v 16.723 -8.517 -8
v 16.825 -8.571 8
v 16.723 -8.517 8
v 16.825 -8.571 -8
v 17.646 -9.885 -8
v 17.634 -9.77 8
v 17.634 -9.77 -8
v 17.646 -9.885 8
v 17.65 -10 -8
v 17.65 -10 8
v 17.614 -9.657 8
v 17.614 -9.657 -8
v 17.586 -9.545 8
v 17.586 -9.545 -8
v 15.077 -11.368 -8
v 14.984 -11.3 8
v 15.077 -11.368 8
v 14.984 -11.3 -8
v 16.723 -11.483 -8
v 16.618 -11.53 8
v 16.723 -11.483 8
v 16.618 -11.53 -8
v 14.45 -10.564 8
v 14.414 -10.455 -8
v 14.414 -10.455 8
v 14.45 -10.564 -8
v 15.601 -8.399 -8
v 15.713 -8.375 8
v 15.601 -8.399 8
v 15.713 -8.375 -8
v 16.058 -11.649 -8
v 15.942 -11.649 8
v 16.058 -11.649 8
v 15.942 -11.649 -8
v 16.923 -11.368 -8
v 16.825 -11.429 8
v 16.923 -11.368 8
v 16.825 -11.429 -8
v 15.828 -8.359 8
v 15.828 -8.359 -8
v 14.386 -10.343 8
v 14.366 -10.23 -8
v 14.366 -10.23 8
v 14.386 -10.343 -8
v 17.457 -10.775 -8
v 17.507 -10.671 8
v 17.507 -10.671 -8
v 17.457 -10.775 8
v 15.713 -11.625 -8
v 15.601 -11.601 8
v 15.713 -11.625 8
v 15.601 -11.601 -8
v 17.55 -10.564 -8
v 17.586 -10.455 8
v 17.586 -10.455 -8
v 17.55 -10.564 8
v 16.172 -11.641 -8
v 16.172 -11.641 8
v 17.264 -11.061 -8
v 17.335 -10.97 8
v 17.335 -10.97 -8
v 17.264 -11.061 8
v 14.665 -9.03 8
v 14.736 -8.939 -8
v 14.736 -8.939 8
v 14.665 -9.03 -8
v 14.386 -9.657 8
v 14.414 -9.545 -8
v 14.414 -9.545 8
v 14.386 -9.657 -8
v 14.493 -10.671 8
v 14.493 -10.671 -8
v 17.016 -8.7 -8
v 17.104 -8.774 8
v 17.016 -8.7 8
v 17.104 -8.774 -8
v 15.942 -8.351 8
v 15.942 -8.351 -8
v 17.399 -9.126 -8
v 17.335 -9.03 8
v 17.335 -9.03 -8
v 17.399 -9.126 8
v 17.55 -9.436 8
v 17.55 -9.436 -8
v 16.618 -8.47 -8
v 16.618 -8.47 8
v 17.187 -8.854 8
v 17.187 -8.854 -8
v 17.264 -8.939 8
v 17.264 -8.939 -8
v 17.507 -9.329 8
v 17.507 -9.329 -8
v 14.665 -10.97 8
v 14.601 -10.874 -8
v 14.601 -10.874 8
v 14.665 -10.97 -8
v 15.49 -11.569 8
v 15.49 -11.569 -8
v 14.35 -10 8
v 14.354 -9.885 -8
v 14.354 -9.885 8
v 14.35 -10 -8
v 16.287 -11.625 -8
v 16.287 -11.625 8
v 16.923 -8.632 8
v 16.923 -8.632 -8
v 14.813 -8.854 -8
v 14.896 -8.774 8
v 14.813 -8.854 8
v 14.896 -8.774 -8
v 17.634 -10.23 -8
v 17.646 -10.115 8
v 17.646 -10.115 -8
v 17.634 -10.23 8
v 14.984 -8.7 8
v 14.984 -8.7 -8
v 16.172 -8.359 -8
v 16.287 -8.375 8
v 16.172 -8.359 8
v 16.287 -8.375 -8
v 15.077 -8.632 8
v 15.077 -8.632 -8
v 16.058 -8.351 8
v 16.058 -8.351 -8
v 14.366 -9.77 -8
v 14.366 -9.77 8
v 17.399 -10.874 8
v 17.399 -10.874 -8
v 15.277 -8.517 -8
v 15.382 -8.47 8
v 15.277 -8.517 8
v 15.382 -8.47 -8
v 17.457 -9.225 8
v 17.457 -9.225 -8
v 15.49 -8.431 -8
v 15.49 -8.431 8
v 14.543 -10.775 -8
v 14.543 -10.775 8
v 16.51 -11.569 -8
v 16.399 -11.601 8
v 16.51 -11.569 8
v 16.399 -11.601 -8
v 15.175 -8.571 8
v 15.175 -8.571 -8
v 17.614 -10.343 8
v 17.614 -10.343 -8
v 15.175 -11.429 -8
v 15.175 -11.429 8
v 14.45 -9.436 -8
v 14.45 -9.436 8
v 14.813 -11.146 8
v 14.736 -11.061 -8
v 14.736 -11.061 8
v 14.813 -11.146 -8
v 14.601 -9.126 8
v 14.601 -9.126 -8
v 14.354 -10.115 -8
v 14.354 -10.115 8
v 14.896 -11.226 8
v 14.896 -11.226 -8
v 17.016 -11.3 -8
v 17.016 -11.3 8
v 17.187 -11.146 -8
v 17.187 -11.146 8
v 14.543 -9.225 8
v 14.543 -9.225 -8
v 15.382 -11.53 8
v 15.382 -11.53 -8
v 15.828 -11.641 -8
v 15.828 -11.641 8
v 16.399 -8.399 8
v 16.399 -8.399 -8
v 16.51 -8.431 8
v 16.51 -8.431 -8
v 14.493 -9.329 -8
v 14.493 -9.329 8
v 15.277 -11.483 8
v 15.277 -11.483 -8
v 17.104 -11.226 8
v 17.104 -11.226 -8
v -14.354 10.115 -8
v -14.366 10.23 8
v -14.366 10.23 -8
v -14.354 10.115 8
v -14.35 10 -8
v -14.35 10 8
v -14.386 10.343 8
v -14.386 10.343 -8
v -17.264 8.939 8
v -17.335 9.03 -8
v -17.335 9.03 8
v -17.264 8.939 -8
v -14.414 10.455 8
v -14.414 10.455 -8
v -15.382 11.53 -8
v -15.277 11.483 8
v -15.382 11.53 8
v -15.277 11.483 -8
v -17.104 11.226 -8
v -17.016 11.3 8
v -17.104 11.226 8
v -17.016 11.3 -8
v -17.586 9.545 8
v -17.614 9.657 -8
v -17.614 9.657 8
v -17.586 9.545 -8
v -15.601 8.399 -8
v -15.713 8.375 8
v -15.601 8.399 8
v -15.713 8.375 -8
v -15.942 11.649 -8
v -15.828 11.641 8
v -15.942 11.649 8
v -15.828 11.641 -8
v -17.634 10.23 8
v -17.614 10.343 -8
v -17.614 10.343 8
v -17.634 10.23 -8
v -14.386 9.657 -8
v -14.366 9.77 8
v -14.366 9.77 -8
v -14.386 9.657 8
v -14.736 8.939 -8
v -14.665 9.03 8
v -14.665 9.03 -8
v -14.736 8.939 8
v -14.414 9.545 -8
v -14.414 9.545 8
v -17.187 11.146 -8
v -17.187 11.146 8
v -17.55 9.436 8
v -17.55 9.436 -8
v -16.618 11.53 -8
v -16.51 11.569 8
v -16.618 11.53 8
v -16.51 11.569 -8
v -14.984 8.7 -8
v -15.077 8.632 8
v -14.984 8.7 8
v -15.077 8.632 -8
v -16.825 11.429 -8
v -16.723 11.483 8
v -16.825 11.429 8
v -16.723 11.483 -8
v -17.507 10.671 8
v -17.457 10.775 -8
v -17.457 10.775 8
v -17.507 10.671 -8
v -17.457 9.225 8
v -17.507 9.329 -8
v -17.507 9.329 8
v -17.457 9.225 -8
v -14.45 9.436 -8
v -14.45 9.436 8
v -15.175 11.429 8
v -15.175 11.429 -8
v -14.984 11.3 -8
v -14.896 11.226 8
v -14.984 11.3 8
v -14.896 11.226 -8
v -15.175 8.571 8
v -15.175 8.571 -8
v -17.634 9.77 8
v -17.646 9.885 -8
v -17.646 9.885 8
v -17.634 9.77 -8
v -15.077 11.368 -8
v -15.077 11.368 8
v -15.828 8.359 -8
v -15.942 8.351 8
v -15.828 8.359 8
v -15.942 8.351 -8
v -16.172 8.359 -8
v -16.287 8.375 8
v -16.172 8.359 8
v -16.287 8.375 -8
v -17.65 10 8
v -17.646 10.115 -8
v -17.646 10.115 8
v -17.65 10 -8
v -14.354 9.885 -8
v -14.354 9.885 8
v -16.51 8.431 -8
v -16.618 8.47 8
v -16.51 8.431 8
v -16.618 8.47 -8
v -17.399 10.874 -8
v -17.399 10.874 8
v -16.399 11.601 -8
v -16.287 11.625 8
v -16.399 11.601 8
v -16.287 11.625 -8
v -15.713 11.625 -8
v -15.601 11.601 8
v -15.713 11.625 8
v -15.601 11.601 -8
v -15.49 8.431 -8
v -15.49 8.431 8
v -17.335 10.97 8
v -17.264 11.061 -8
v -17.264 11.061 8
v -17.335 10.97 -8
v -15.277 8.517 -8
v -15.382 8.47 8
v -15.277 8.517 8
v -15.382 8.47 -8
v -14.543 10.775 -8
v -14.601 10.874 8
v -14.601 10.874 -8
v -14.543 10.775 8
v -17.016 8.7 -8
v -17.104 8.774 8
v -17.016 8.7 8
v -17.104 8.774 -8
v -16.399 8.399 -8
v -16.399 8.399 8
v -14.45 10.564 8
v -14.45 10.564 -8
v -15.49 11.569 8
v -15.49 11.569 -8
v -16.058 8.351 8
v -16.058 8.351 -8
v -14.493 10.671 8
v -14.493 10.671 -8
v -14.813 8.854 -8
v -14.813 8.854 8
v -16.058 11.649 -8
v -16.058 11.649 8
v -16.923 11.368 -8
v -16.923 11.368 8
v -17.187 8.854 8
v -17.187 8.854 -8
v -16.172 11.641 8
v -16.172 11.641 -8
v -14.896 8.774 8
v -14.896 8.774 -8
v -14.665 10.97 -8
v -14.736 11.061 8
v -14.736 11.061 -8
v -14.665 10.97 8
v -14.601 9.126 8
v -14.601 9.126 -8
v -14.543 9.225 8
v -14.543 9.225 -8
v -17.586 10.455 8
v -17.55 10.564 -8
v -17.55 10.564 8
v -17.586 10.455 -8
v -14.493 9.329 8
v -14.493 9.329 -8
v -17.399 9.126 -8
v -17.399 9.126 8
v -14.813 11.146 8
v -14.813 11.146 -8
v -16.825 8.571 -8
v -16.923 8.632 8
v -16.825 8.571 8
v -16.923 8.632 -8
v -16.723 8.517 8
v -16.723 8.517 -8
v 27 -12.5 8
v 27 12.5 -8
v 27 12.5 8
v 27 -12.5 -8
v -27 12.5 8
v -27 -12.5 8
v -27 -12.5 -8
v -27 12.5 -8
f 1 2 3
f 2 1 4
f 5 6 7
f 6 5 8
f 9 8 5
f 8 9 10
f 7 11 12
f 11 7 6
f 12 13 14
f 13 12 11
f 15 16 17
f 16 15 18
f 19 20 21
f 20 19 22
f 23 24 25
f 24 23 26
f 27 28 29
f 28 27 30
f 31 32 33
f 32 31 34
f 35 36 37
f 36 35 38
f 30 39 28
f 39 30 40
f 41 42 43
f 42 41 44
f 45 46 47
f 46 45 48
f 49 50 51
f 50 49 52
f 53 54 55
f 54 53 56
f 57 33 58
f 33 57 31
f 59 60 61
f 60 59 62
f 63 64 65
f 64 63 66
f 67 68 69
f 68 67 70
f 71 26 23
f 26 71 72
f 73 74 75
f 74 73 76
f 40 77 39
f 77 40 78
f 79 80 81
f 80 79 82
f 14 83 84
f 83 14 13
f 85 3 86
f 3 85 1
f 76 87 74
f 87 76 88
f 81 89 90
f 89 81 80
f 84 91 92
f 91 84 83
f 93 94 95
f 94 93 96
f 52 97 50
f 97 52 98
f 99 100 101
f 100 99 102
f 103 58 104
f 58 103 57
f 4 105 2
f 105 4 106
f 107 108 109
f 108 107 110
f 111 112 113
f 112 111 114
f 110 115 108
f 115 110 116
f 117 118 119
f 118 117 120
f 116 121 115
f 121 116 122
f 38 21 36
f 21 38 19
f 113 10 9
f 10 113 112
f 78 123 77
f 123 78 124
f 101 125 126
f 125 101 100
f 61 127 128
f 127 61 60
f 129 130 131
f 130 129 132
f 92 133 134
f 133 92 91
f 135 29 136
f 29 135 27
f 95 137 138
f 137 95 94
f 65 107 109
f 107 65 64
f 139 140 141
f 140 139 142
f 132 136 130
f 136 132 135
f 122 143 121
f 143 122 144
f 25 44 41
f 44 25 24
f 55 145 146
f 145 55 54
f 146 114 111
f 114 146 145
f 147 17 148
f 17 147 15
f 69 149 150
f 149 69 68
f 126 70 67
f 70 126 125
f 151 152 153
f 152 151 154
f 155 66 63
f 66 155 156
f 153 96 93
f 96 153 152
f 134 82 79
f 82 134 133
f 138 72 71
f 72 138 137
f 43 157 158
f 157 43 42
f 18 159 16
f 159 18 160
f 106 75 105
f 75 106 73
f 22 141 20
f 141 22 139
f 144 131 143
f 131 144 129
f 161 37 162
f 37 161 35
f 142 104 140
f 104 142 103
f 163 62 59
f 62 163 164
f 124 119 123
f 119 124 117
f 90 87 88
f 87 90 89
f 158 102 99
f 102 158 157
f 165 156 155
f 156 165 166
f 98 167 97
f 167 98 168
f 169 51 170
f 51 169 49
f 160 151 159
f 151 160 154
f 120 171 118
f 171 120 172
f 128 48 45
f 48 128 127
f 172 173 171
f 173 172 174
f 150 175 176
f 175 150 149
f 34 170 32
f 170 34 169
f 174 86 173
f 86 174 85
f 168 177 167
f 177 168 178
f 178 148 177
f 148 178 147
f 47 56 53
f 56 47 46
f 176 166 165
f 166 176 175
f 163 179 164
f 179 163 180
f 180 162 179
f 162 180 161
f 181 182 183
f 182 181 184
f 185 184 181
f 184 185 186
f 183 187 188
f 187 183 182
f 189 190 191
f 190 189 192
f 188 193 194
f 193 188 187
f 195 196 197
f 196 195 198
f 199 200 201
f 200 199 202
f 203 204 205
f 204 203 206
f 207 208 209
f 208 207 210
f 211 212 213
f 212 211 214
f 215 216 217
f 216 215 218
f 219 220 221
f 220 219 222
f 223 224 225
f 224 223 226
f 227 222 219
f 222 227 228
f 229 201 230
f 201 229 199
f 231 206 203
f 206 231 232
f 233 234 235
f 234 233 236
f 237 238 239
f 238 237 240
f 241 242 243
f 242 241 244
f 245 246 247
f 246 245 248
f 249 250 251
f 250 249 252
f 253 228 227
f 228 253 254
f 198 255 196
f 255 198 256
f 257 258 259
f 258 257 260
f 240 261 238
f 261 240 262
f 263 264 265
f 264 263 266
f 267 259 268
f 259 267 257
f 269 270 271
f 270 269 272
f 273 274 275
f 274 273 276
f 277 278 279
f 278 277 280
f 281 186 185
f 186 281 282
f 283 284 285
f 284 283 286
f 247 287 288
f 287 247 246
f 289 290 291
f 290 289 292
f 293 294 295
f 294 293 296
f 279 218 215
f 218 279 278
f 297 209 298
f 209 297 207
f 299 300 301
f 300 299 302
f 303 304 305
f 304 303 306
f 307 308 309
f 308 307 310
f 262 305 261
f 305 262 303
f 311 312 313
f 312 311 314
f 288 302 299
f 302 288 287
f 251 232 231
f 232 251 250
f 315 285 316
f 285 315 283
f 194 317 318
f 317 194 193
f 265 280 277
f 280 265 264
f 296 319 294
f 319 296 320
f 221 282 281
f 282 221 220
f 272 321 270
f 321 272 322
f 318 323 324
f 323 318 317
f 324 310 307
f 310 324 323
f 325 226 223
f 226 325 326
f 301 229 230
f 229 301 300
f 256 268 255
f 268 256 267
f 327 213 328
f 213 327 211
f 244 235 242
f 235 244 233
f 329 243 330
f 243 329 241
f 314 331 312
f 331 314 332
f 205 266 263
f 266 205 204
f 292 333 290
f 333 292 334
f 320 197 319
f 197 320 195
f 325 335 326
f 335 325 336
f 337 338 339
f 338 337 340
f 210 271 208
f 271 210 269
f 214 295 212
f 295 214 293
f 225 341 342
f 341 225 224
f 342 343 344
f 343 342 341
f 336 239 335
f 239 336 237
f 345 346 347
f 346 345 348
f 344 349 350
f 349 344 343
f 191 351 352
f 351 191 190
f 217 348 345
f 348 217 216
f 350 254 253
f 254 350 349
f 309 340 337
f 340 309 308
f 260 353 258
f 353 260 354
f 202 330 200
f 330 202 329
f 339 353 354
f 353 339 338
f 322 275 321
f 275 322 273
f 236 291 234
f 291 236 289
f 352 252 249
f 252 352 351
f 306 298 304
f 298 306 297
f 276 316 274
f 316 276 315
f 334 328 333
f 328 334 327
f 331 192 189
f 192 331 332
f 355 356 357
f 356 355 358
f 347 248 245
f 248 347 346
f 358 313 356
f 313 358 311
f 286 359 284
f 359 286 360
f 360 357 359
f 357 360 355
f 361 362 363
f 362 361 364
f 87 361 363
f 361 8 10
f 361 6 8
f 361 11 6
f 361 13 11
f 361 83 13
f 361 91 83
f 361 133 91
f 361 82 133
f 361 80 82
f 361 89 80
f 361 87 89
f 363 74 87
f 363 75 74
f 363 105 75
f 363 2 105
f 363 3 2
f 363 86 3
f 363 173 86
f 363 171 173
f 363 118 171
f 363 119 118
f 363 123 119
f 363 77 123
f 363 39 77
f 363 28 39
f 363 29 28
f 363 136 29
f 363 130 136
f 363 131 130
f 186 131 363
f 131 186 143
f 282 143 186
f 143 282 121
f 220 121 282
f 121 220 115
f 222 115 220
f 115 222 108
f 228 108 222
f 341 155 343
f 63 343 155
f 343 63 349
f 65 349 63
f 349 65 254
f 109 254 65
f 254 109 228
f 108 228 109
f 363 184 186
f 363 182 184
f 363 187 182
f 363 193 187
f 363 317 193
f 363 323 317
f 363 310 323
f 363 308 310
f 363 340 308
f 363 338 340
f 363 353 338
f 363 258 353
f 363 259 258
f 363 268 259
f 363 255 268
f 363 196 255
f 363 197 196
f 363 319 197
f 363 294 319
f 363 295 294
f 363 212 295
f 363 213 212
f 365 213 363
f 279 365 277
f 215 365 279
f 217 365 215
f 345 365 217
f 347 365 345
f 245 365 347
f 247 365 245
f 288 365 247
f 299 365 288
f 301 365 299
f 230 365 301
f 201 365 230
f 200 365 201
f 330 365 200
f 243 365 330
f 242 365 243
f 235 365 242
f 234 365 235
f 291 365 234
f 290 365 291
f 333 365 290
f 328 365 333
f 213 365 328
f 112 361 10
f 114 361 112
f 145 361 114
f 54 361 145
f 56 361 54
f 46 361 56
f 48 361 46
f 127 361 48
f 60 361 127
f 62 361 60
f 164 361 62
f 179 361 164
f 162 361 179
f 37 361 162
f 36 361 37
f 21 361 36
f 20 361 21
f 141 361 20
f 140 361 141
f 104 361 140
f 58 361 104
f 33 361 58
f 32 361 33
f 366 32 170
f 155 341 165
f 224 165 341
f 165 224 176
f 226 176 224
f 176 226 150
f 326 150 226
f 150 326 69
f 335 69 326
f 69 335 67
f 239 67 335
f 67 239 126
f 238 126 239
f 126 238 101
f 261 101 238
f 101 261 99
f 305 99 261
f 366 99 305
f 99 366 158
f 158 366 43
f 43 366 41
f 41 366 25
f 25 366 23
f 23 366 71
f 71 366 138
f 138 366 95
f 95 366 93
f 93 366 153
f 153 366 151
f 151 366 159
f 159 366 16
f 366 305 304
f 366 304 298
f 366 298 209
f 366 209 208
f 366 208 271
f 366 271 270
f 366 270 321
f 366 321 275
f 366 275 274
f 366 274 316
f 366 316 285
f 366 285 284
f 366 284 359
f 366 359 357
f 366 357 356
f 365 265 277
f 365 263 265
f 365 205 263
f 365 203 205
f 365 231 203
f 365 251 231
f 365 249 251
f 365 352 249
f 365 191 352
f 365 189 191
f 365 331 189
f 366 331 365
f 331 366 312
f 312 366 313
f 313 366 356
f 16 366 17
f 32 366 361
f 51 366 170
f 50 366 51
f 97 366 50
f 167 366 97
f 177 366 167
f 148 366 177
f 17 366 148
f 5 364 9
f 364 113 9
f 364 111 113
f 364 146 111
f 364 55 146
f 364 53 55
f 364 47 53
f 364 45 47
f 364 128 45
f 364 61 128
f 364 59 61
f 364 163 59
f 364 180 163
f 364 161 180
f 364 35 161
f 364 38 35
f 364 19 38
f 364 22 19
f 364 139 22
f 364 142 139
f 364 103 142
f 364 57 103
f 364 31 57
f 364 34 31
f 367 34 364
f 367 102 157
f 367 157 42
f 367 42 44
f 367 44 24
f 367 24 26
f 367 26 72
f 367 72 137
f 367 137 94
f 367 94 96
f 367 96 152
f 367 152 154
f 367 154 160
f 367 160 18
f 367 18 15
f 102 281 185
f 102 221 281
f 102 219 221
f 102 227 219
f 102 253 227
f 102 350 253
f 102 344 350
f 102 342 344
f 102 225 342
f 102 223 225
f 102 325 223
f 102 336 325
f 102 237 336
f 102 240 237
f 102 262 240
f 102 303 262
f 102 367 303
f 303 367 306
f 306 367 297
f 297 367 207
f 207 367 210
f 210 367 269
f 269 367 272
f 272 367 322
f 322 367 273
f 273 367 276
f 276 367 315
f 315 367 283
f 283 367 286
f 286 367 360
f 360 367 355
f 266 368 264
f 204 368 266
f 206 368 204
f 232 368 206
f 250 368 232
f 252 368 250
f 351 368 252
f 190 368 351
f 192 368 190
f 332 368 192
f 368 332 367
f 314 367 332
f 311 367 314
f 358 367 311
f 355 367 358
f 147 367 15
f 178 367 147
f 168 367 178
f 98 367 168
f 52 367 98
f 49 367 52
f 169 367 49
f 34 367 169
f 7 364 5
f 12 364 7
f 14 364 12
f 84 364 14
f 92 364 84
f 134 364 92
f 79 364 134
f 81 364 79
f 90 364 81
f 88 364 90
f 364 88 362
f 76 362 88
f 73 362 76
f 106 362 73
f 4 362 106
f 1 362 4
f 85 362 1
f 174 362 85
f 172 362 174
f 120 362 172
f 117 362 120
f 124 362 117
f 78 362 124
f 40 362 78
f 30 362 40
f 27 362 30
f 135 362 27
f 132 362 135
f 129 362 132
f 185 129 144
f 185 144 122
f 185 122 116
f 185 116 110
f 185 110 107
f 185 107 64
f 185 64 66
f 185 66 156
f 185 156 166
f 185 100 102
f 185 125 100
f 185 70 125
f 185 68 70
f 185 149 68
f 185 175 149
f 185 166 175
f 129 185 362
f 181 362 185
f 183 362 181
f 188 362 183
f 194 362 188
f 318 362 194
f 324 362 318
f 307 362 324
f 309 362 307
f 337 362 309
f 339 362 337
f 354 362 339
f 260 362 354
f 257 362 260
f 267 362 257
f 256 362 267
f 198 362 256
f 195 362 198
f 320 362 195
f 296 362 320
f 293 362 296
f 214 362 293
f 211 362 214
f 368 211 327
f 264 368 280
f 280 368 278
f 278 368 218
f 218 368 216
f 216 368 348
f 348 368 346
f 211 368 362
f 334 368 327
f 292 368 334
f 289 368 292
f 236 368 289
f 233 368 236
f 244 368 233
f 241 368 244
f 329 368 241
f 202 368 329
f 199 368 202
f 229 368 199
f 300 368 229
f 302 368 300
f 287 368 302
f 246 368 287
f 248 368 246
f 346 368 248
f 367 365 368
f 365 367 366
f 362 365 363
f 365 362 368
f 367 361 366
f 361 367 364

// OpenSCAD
$fn = 90;

module level_shifter_holes(
    hole_d = 3.3,
    hole_h = 300,
    hole_positions = [[16, -10], [-16, 10]]
) {
    for (pos = hole_positions) {
        translate([pos[0], pos[1], 0])
            cylinder(d = hole_d, h = hole_h, center = true);
    }
}

module level_shifter(
    body_size = [54, 25, 16],
    hole_d = 3.3,
    hole_h = 300,
    hole_positions = [[16, -10], [-16, 10]]
) {
    difference() {
        cube(body_size, center = true);
        level_shifter_holes(hole_d = hole_d, hole_h = hole_h, hole_positions = hole_positions);
    }
}

level_shifter();
